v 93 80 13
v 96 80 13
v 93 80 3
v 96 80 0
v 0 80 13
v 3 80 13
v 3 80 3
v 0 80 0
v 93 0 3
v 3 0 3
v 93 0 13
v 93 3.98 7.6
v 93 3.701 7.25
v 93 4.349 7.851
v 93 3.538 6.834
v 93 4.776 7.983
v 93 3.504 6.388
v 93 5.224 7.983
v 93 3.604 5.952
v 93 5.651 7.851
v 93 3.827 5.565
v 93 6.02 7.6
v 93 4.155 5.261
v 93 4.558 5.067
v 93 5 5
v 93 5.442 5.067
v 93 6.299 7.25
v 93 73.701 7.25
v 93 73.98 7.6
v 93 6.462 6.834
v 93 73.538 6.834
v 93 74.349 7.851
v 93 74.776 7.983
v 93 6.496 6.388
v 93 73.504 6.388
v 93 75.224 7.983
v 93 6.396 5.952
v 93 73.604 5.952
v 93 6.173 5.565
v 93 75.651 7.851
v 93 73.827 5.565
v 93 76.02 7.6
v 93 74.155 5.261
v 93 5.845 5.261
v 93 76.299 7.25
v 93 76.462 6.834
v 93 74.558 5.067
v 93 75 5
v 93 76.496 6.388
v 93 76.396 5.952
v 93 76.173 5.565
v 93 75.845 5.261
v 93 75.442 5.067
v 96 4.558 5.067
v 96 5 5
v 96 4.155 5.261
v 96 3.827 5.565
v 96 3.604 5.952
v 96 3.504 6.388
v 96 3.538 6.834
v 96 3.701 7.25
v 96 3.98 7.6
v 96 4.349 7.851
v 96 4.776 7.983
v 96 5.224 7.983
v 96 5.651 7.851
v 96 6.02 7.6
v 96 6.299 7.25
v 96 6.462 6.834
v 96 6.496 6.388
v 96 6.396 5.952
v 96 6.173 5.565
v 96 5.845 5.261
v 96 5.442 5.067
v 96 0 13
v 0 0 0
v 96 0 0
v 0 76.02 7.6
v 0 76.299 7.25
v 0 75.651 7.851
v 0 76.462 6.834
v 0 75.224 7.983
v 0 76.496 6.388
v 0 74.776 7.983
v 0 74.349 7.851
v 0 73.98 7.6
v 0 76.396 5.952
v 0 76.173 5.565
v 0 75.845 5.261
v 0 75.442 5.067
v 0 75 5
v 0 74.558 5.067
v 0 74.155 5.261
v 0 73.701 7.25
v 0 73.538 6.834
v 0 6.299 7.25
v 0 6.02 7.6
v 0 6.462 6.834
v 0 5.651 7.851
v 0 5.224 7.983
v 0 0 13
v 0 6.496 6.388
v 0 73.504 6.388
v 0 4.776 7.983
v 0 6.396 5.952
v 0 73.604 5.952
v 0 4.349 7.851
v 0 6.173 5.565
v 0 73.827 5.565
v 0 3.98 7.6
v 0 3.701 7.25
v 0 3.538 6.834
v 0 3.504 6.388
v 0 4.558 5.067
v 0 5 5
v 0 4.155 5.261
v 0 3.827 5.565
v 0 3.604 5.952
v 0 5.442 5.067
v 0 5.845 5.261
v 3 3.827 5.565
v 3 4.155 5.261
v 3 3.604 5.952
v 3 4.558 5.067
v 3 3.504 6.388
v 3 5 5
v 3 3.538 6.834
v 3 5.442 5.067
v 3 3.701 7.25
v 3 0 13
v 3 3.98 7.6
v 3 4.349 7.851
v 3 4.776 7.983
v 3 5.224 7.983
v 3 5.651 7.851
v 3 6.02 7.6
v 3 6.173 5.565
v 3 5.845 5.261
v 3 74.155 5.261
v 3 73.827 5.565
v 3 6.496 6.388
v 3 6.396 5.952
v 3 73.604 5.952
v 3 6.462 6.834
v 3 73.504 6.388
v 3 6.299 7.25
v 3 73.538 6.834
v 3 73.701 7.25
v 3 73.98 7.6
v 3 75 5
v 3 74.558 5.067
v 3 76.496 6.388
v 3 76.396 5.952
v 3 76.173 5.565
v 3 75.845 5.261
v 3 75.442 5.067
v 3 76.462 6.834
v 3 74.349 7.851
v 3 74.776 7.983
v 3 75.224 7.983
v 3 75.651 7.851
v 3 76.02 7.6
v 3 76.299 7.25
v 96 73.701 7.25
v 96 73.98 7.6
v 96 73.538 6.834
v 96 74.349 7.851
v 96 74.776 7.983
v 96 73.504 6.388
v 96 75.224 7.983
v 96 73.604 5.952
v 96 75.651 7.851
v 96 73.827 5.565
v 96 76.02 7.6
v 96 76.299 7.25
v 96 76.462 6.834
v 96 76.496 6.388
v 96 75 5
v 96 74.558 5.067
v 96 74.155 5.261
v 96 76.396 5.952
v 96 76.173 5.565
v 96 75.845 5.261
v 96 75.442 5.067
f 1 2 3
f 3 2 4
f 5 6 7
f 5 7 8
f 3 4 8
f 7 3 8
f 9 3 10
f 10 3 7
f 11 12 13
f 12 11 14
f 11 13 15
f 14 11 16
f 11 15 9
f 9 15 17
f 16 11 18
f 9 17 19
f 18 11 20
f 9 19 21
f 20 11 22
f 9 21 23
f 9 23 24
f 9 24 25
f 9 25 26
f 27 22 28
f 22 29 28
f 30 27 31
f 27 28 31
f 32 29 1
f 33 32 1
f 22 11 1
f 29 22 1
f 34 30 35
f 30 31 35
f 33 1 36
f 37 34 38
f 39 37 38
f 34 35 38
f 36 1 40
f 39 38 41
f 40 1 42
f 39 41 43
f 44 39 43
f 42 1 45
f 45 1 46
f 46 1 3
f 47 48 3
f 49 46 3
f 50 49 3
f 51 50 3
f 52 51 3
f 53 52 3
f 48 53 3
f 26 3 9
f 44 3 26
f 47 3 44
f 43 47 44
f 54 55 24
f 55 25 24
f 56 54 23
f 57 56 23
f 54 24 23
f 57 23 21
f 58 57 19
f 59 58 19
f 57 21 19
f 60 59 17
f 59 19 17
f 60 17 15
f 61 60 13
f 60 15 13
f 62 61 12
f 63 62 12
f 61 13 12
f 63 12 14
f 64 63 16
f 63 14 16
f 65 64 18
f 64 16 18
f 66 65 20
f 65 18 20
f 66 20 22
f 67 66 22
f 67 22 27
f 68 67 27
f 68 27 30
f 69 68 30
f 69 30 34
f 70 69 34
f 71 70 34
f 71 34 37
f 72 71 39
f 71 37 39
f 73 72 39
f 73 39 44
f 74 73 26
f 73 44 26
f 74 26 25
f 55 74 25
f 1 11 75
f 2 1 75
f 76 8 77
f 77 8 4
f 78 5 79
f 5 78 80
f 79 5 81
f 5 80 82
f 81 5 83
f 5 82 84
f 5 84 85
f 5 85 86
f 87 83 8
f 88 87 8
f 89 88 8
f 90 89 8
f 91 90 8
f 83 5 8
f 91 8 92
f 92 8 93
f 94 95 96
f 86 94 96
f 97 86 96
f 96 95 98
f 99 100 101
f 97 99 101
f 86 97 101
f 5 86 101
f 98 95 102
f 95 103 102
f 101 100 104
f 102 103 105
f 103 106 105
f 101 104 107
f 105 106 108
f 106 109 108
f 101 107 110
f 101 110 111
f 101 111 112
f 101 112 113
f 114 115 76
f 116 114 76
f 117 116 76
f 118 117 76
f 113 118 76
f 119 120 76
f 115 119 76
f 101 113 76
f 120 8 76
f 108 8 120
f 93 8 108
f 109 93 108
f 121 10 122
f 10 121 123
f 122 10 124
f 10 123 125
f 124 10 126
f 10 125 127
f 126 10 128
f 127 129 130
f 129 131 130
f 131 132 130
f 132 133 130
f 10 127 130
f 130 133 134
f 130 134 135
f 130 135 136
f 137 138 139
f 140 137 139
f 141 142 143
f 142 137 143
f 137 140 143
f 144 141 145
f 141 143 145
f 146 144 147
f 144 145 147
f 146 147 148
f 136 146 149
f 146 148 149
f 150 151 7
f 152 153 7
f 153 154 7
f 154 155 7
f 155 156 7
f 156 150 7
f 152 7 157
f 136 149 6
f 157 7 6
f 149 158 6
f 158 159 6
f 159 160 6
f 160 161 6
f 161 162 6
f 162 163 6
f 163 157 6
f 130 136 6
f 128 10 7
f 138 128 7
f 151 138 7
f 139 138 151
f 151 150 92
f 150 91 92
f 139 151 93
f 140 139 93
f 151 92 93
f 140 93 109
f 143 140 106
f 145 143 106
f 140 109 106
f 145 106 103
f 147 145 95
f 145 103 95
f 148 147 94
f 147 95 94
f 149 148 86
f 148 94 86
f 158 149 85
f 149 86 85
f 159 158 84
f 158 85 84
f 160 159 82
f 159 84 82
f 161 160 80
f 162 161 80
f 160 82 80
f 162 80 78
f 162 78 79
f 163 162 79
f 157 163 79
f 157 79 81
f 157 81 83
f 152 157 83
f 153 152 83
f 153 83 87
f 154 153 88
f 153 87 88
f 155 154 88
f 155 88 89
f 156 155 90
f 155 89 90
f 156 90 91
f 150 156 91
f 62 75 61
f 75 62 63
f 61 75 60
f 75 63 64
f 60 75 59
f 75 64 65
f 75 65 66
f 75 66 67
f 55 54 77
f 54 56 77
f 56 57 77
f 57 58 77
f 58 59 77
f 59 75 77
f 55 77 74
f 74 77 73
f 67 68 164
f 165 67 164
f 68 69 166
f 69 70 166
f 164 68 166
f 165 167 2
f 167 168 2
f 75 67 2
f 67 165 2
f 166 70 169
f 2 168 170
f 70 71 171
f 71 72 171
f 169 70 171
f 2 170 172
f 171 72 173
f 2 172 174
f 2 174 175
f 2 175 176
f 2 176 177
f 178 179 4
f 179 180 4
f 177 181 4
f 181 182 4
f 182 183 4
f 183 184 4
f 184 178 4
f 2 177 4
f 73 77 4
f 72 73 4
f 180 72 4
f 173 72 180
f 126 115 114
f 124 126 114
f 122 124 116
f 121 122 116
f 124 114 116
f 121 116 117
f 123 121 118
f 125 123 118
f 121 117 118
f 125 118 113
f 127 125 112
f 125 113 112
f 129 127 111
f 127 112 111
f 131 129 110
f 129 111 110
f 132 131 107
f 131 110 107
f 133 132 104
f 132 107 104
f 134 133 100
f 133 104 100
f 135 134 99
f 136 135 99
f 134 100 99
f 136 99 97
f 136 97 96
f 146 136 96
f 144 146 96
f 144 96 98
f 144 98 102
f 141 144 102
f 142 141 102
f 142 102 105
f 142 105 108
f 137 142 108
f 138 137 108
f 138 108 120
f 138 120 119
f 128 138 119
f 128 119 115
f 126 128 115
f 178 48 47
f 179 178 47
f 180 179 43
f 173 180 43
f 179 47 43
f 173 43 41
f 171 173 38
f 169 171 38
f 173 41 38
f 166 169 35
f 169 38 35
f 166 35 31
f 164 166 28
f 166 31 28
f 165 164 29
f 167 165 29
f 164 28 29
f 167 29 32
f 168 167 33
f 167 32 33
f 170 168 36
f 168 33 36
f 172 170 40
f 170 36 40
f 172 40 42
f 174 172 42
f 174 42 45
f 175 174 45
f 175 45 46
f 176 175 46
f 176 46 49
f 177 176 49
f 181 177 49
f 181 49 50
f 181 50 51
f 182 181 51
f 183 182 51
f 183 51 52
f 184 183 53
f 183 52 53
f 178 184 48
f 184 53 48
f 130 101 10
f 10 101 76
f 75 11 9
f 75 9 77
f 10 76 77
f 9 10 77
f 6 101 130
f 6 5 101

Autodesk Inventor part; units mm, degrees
ref_plane "YZ Plane" through (0, 0, 0) normal (1, 0, 0) x (0, 1, 0)
ref_plane "XZ Plane" through (0, 0, 0) normal (0, 1, 0) x (-1, 0, 0)
ref_plane "XY Plane" through (0, 0, 0) normal (0, 0, 1) x (1, 0, 0)
sketch "Sketch1" plane through (0, 0, 0) normal (0, 0, 1) x (1, 0, 0)
  line L0 (0, 0) -> (96, 0)
  line L1 (96, 0) -> (96, 80)
  line L2 (96, 80) -> (0, 80)
  line L3 (0, 80) -> (0, 0)
  dimension "d0" = 96
  dimension "d1" = 80
extrude "Extrusion1" add sketch "Sketch1" along normal blind 13
sketch "Sketch2" plane through (0, 80, 0) normal (0, 1, 0) x (1, 0, 0)
  line L0 (3, -13) -> (93, -13)
  line L1 (93, -13) -> (93, -3)
  line L2 (93, -3) -> (3, -3)
  line L3 (3, -3) -> (3, -13)
  line L4 (0, 0) -> (0, -13) projected
  line L5 (96, 0) -> (0, 0) projected
  line L6 (96, 0) -> (96, -13) projected
  dimension "d4" = 3
  dimension "d5" = 3
  dimension "d6" = 3
extrude "Extrusion2" cut sketch "Sketch2" against normal through all
sketch "Sketch3" plane through (96, 0, 0) normal (1, 0, 0) x (0, 0, -1)
  line L0 (0, 80) -> (-13, 80) construction
  line L1 (-6.5, 80) -> (-6.5, 0) construction
  line L2 (0, 0) -> (-13, 0) construction
  line L3 (-13, 0) -> (-13, 80) construction
  line L4 (0, 0) -> (0, 80) projected
  point P0 (-6.5, 75)
  point P1 (-6.5, 5)
  dimension "d17" = 70
  dimension "d18" = 5
  dimension "d19" = 6.5
hole "Hole1" at (96, 75, 6.5) at (96, 5, 6.5) direction (-1, 0, 0) diameter 3 end through all
properties part number "Mirror_shell_adapter"
